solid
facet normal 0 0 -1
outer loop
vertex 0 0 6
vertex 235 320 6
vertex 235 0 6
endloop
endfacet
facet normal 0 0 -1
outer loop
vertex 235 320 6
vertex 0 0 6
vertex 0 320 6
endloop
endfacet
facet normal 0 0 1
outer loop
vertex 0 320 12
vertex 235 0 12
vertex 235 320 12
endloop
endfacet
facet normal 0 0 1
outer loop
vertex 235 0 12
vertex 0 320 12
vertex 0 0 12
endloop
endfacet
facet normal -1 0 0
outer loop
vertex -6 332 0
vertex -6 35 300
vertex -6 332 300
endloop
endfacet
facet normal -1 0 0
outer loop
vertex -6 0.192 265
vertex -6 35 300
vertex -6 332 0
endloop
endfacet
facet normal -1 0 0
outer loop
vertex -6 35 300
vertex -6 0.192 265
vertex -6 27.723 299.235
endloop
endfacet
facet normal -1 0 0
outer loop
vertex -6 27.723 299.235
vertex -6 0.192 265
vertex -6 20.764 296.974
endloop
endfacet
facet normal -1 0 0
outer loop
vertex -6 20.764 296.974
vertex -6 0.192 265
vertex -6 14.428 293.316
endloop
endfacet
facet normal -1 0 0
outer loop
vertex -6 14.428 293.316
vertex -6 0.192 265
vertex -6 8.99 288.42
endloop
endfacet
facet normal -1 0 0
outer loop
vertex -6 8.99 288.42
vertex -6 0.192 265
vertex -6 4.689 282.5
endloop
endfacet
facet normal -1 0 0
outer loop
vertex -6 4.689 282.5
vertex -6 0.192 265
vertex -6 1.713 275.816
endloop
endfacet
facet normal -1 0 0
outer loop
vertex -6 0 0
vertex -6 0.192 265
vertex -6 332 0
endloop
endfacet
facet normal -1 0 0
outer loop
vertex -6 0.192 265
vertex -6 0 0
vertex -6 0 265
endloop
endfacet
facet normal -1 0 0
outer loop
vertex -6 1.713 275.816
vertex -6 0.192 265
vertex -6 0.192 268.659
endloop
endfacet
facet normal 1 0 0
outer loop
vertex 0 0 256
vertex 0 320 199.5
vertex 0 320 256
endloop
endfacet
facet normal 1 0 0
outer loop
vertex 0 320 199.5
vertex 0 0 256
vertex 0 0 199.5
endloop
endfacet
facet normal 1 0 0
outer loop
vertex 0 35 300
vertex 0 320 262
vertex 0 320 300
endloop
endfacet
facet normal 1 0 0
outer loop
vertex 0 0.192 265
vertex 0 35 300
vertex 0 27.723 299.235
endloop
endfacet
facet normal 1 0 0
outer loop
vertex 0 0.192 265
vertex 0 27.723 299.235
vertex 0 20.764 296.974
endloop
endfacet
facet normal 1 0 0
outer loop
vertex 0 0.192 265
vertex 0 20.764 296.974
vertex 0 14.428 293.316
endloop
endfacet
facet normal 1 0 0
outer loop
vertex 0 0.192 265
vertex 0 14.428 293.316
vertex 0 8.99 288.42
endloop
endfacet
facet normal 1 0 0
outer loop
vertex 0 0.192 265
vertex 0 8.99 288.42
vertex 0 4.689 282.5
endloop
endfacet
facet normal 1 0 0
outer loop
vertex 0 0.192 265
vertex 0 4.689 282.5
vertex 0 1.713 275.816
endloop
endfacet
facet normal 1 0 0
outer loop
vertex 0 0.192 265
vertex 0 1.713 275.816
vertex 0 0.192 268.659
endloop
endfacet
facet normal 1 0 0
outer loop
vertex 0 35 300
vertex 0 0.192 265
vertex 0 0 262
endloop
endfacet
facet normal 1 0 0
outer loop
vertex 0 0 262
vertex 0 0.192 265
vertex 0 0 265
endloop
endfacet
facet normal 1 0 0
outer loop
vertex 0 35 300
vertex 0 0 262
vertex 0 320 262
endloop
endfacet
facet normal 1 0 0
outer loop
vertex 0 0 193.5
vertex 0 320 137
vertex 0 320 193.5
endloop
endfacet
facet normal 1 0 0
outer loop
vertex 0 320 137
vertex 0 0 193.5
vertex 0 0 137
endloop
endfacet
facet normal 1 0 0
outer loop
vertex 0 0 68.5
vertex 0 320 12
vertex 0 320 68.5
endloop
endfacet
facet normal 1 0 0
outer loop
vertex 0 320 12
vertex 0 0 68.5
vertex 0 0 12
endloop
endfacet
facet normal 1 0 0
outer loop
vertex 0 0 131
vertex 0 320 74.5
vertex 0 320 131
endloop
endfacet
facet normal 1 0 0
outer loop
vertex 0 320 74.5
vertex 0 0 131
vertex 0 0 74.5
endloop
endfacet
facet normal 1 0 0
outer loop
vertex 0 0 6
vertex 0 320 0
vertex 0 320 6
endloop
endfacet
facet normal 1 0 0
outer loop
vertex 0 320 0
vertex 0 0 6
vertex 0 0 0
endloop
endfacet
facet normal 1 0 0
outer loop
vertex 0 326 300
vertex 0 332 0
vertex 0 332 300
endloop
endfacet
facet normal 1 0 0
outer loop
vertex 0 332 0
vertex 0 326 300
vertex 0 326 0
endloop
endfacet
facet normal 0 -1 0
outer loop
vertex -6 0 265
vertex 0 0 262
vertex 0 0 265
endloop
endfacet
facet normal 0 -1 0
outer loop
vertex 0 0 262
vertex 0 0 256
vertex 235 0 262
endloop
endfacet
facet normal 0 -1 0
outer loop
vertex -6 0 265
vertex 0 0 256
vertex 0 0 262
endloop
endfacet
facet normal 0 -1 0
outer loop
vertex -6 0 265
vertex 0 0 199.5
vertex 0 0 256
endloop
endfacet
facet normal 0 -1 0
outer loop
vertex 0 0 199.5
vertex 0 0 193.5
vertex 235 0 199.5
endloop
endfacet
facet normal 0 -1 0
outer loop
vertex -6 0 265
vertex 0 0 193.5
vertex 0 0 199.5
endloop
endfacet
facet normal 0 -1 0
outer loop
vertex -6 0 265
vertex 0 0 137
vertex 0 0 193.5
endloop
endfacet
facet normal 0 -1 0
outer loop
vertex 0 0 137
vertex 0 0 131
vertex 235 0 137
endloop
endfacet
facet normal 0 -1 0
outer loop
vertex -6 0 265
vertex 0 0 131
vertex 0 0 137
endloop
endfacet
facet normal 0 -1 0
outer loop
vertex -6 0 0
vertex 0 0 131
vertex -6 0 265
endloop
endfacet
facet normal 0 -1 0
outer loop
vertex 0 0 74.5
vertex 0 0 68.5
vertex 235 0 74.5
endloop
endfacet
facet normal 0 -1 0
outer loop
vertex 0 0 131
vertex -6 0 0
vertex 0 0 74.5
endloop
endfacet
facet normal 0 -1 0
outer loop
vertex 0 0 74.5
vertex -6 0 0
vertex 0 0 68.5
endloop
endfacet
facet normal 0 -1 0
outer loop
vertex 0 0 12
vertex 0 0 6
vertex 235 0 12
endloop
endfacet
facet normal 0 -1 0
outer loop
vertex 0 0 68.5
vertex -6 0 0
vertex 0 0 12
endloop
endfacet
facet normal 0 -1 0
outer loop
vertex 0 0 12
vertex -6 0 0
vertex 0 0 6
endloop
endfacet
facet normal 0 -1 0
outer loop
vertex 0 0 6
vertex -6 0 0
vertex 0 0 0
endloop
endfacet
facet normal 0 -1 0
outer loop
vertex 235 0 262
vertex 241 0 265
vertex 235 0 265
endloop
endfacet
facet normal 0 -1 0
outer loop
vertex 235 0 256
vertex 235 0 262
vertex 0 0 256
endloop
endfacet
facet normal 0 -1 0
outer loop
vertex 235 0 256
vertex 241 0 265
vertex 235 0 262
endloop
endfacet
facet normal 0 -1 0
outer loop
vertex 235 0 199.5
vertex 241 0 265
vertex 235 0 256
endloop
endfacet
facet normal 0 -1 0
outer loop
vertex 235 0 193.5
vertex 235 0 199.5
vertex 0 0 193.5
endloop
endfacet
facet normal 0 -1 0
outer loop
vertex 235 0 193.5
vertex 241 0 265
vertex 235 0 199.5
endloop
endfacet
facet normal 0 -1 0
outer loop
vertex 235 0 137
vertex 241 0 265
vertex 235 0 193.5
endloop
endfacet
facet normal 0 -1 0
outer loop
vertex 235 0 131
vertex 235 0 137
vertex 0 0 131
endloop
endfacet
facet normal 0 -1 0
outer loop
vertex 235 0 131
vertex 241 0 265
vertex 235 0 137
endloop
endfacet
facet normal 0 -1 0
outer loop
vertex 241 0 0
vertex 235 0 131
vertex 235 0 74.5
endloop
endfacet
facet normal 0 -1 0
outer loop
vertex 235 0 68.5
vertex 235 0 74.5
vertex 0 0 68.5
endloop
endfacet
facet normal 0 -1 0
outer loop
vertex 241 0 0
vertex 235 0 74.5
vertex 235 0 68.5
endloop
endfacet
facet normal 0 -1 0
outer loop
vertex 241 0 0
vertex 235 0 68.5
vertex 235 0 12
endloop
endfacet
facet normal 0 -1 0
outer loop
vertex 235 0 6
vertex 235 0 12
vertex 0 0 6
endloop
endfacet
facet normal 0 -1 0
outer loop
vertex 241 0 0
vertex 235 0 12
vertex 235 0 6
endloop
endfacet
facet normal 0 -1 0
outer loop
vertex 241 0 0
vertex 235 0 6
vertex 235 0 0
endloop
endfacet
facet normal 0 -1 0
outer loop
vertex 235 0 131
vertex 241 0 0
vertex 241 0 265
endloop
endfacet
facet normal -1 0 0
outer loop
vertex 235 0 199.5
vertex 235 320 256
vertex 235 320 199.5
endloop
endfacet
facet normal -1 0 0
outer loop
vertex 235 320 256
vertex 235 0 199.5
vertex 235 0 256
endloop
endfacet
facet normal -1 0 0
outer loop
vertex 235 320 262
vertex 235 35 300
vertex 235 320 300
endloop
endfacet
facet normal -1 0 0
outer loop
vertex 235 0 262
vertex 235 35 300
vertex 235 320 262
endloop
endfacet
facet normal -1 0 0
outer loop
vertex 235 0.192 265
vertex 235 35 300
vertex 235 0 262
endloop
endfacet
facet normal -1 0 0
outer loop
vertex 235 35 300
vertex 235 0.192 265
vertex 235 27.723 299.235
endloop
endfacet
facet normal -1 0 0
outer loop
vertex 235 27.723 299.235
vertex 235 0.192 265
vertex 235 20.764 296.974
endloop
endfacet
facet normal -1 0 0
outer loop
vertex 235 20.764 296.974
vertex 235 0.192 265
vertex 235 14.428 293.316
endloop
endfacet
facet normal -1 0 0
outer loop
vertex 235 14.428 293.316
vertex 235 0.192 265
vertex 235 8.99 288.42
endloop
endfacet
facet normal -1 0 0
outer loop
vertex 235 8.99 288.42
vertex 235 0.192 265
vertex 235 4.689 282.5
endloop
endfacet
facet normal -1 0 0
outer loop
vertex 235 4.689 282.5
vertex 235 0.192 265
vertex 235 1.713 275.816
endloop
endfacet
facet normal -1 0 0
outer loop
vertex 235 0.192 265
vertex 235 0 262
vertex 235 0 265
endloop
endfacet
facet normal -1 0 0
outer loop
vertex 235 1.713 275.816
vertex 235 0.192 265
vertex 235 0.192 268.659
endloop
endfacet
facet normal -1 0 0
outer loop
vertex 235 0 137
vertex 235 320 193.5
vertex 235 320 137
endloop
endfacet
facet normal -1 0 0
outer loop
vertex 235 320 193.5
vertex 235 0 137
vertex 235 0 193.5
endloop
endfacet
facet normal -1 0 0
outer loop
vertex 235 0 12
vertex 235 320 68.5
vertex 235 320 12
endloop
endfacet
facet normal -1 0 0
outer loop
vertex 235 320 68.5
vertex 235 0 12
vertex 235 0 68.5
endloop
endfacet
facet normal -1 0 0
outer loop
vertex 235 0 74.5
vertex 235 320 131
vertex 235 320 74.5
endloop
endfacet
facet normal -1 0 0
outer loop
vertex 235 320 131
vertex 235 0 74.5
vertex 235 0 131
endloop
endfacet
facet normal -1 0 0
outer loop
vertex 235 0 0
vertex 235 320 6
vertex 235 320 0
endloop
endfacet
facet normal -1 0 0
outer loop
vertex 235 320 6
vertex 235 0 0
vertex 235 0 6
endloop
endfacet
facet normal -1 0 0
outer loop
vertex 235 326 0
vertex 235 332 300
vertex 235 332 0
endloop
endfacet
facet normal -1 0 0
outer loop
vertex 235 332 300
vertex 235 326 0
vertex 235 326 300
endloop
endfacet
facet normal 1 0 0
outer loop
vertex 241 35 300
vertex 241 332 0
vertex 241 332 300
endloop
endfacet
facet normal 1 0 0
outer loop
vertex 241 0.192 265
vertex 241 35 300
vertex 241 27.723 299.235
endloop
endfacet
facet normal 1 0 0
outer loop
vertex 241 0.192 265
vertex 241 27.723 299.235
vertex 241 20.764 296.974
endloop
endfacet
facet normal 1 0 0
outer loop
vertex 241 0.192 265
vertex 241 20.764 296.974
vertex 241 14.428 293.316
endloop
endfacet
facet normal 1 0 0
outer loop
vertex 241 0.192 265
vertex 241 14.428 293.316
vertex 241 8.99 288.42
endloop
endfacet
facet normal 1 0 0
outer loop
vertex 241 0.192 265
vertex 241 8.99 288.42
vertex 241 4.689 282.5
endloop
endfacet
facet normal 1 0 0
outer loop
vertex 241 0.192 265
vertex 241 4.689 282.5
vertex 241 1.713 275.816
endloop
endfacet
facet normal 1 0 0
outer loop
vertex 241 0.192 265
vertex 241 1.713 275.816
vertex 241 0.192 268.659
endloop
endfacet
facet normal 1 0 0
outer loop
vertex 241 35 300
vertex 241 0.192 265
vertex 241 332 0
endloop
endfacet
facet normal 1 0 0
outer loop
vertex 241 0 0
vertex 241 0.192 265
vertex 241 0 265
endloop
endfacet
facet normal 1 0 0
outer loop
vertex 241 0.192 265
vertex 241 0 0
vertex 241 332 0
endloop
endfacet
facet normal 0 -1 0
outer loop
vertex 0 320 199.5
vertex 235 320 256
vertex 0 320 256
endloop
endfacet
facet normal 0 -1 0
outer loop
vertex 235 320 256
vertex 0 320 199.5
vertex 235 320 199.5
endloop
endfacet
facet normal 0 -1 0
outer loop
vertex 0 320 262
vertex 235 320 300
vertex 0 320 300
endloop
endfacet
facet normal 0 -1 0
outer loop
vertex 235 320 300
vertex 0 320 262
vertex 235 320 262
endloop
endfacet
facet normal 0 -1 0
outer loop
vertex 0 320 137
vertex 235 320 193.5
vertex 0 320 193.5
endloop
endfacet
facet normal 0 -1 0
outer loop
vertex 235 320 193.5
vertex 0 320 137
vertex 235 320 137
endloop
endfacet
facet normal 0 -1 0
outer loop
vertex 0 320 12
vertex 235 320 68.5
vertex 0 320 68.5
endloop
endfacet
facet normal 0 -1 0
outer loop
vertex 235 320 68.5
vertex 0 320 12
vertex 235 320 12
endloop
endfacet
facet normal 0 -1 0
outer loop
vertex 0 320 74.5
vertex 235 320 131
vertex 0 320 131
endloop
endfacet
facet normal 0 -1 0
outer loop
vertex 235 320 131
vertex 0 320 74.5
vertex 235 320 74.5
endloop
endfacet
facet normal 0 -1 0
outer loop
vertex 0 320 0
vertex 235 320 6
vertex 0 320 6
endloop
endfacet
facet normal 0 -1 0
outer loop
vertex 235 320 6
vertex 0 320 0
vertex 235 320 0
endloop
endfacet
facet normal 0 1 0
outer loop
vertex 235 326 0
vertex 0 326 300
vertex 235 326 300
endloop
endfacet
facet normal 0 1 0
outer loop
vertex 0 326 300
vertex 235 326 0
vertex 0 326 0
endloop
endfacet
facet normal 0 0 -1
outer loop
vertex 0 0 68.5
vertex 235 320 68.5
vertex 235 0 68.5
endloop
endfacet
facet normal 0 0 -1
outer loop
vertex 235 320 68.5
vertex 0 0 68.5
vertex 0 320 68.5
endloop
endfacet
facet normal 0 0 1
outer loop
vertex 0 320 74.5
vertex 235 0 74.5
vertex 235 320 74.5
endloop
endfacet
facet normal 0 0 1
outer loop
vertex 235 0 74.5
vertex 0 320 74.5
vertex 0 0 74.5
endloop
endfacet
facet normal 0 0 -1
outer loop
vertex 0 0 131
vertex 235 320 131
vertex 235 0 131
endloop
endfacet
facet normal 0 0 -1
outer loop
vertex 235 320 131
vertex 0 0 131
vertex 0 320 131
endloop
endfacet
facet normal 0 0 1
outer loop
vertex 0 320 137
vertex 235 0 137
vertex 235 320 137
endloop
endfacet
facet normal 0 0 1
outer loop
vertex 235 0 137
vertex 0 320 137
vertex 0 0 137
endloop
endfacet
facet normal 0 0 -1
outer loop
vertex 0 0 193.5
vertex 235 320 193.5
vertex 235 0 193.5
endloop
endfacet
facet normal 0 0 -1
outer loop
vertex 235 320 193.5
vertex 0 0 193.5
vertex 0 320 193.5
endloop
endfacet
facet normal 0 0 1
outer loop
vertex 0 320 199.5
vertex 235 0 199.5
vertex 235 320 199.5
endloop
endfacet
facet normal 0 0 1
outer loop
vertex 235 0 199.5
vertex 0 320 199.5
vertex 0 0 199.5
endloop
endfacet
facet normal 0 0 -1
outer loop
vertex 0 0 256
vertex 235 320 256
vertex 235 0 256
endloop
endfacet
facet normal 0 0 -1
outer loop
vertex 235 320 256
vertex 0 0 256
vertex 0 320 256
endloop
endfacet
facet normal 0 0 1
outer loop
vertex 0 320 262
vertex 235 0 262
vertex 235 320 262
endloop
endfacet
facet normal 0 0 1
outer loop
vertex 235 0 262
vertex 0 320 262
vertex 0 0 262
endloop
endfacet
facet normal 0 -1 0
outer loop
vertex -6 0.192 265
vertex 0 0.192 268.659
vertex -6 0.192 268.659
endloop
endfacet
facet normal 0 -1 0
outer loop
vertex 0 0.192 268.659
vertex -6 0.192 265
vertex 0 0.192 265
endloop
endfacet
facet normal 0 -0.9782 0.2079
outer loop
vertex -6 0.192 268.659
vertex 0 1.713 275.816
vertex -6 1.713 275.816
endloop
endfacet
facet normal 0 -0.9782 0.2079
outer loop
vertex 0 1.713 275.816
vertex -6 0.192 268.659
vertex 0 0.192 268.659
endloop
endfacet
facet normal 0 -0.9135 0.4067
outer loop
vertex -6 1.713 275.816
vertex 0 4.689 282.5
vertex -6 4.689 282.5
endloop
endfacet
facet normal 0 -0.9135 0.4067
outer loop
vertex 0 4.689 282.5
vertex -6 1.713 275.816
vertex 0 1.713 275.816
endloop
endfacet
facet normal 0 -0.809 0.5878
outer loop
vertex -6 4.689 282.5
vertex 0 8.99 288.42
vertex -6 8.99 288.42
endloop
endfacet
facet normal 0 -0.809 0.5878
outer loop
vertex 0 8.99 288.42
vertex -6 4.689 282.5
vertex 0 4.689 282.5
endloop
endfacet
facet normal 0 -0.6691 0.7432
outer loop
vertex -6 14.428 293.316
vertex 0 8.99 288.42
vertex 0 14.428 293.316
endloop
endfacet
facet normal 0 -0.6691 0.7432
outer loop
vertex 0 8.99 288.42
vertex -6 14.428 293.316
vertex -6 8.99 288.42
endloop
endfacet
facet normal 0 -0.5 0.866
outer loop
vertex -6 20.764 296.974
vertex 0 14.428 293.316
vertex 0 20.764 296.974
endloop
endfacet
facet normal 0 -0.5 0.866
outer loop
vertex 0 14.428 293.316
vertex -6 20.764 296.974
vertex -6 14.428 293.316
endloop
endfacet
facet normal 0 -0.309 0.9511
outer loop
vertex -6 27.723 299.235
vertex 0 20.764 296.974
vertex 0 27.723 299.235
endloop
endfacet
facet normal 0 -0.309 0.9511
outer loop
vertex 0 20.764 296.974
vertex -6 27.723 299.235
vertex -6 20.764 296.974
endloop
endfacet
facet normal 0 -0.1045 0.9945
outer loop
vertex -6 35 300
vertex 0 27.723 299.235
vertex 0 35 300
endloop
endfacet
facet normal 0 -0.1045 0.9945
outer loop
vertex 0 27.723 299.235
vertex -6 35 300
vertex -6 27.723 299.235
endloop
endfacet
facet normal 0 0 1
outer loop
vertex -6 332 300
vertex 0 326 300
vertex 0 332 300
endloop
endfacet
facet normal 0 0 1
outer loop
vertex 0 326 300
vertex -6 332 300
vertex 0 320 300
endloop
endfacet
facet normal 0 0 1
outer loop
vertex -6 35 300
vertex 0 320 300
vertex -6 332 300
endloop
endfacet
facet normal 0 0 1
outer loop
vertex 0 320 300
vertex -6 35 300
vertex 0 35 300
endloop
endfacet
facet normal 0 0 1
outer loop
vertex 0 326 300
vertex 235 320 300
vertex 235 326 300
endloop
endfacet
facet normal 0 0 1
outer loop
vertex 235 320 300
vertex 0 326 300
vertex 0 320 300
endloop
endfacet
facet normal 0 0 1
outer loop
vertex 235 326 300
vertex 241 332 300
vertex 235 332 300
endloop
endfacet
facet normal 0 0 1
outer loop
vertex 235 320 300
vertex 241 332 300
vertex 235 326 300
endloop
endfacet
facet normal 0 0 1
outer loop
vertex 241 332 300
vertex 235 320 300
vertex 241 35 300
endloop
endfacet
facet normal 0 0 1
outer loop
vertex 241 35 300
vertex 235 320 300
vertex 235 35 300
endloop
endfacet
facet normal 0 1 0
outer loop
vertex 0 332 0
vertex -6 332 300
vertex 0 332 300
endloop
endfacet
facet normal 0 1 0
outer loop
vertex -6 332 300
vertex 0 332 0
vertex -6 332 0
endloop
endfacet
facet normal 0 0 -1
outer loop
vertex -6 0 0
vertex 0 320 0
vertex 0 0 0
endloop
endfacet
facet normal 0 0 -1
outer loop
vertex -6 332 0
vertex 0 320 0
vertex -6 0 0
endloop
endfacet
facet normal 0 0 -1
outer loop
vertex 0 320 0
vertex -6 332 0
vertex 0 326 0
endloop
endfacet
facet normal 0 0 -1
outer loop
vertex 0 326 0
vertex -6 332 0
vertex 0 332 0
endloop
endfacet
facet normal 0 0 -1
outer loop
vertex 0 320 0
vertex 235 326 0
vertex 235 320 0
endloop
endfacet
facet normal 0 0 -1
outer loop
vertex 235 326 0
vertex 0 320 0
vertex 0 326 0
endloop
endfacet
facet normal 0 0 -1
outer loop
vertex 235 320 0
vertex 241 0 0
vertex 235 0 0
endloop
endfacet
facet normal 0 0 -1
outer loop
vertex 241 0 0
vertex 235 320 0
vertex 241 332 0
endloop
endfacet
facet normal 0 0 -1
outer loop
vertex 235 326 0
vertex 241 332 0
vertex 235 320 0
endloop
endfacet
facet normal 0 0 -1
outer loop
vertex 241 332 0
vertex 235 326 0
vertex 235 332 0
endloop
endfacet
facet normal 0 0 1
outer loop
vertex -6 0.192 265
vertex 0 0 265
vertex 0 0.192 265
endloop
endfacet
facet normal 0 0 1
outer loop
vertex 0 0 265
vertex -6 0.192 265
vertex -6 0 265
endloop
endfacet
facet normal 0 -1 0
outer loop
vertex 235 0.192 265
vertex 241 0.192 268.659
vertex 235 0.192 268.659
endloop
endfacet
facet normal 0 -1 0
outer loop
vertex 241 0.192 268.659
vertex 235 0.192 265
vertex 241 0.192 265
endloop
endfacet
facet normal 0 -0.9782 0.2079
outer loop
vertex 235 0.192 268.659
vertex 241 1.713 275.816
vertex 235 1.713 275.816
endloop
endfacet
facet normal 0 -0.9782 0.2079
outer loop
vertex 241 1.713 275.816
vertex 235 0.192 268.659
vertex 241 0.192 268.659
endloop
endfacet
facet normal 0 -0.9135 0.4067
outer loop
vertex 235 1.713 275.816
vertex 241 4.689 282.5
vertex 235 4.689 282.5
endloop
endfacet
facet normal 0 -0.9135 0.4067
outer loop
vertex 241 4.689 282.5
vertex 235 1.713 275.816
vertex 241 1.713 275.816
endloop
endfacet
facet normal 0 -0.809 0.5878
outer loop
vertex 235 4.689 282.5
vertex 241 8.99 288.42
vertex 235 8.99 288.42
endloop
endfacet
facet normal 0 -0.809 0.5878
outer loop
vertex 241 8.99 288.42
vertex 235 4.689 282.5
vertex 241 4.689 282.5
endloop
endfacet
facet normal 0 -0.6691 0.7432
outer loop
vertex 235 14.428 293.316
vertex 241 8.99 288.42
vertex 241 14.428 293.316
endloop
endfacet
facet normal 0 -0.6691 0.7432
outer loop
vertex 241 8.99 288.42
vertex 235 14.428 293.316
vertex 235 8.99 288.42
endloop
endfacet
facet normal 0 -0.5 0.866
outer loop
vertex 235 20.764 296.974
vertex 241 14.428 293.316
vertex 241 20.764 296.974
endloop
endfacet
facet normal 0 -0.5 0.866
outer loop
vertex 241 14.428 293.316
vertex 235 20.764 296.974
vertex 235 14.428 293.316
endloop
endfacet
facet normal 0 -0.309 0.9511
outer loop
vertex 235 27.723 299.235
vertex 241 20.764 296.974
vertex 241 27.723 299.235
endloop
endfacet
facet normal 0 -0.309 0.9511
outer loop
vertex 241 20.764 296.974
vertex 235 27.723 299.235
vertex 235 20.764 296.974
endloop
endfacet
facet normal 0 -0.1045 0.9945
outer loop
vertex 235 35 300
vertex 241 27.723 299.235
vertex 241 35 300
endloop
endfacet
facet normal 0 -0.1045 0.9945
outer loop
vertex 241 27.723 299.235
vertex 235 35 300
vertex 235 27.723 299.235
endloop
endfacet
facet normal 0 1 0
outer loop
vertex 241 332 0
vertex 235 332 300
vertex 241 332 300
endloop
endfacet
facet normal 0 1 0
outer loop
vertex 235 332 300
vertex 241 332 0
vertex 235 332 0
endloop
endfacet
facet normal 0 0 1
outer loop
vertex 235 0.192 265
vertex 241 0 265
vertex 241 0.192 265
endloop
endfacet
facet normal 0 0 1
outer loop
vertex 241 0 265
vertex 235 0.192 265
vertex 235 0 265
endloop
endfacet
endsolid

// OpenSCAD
mode =
//	"shapes";
	"3dview";

num_shelves = 4;
extra_h = 50;
round_r = 35;

shelf_w = 235;
shelf_h = (300-extra_h)/4;
shelf_d = 320;

thickness = 6;
locks_h = 10;
locks_w = 5;
locks_d = 5;

explode = (sin($t*360 - 90)+1)*10;
total_h = num_shelves*shelf_h + extra_h;

function shelf_hpos(i) = thickness + i*shelf_h;

module backside()
{
	difference() {
		union() {
			square([ shelf_w, total_h ]);
			for (i = [0:locks_h]) {
				translate([ 0, 2*thickness + (total_h-5*thickness)*i/locks_h ]) {
					translate([ -thickness, 0 ]) square([ thickness*2, thickness ]);
					translate([ shelf_w-thickness, 0 ]) square([ thickness*2, thickness ]);
				}
			}
		}
		for (i  = [0:num_shelves]) {
			for (j  = [0:locks_w])
				translate([ 2*thickness+(shelf_w-5*thickness)*j/locks_w, shelf_hpos(i) ])
					square([ thickness, thickness ]);
		}
	}
}

module shelf()
{
	square([ shelf_w, shelf_d ]);
	for (i = [0:locks_d]) {
		translate([ 0, 2*thickness + (shelf_d-5*thickness)*i/locks_d ]) {
			translate([ -thickness, 0 ]) square([ thickness*2, thickness ]);
			translate([ shelf_w-thickness, 0 ]) square([ thickness*2, thickness ]);
		}
	}
	for (j  = [0:locks_w])
		translate([ 2*thickness+(shelf_w-5*thickness)*j/locks_w, shelf_d ])
			square([ thickness, thickness ]);
}

module side()
{
	difference() {
		square([ total_h, shelf_d+thickness*2 ]);
		for (i  = [0:num_shelves]) {
			for (j  = [0:locks_d])
				translate([ shelf_hpos(i), 2*thickness+(shelf_d-5*thickness)*j/locks_d ])
					square([ thickness, thickness ]);
		}		
		for (i = [0:locks_h]) {
			translate([ 2*thickness + (total_h-5*thickness)*i/locks_h, shelf_d ]) 
				square([ thickness, thickness ]);
		}
		translate([ total_h-round_r, -round_r ])
		difference() {
			square(round_r*2);
			translate([ 0, round_r*2]) circle(round_r);
		}
	}
}

if (mode == "shapes") {
	translate([ -shelf_w -3*thickness, shelf_d+thickness*3 ]) backside();
	translate([ -shelf_w -3*thickness, 0 ]) shelf();
	side();
}

if (mode == "3dview") {
	color([ 0.3, 0.7, 0.3 ]) for (i = [0:num_shelves])
		translate([ 0, 0, shelf_hpos(i) ]) linear_extrude(height = thickness) shelf();
	color([ 0.7, 0.3, 0.7 ]) for (i = [0:1])
		translate([ i*(shelf_w+thickness) - explode + i*2*explode, 0, 0 ]) rotate([ 0, -90, 0 ])
			linear_extrude(height = thickness) side();
	color([ 0.7, 0.3, 0.3 ]) translate([ 0, shelf_d+thickness + explode, 0 ]) rotate([ 90, 0, 0 ])
			linear_extrude(height = thickness) backside();
}
